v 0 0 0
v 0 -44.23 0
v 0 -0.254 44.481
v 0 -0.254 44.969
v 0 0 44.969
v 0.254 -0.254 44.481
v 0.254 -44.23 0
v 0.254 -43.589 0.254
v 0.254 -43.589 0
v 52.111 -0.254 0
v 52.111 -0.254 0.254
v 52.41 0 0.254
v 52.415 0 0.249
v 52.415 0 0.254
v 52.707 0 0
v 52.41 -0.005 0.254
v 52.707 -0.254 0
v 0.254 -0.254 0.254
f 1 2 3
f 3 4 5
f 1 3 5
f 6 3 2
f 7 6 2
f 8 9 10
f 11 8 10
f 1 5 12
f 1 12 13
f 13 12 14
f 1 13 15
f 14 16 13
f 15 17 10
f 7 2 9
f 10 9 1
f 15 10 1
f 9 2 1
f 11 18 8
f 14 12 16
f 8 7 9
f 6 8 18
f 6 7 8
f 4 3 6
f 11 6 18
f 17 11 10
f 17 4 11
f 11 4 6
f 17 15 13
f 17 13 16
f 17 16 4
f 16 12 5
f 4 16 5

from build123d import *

# Parameters (mm, degrees)
F1_DEPTH = 0.254
F3_DEPTH = 0.254
F5_DEPTH = 0.254


with BuildPart() as f1:
    # F0 (on Front) → F1 (new body)
    with BuildSketch(Plane.XZ):
        Polygon((0, 44.969123), (0, 0), (52.707318, 0), align=None)
    extrude(amount=F1_DEPTH)

    # F2 (on Right) → F3 (join)
    with BuildSketch(Plane.YZ):
        Polygon((-44.229742, 0), (0, 0), (0, 44.73836), align=None)
    extrude(amount=F3_DEPTH)

    # F4 (on Top) → F5 (join)
    with BuildSketch(Plane.XY):
        Polygon((0, 0), (0, -43.801095), (52.415315, 0), align=None)
    extrude(amount=F5_DEPTH)


solid = f1.part
